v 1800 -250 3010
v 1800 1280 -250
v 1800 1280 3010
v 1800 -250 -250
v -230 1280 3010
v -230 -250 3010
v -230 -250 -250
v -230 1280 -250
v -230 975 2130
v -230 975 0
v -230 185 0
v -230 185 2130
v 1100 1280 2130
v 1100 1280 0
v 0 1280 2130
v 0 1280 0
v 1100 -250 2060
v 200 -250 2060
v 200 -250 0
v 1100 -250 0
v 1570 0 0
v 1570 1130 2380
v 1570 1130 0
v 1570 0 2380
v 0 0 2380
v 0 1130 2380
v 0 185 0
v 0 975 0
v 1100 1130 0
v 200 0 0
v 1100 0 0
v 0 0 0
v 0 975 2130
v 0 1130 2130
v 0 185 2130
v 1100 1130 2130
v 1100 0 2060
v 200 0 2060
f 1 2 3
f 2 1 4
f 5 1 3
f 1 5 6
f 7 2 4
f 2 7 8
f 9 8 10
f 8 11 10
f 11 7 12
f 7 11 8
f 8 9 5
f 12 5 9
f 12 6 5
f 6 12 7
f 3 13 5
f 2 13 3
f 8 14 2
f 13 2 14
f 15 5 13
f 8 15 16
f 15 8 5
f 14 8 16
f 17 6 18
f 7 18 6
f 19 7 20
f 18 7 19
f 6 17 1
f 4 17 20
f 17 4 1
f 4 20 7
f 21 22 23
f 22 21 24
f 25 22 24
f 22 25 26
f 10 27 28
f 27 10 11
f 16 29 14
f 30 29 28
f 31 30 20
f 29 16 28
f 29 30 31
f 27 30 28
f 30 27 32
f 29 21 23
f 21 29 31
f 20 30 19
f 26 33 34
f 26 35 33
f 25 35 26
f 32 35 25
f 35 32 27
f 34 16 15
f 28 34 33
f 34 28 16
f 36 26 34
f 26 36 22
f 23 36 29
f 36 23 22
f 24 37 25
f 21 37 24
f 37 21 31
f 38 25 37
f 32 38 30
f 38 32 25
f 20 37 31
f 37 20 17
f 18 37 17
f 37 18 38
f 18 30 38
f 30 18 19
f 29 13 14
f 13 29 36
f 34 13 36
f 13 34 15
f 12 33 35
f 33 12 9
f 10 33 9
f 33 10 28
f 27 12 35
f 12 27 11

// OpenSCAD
//created 2015-4-16
//by xdw
//my house 3D model



//鞋柜门廊空间
module porch(){

//进门门厅墙厚度
enter_wall_thick = 250;
//厨房和次卫墙厚度
side_wall_thick = 230;
//与客厅隔墙厚度
kt_wall_thick =150;

//面对进门水平方向长度
length = 1570;
//垂直大门，鞋柜空间宽度
width = 1130;
//高度
height = 2760;
//吊顶
top = 380;
//门洞距离吊顶高度
door_top = 320;
difference(){
//外墙空间
translate([-side_wall_thick,-enter_wall_thick,-enter_wall_thick])
cube([(length+2*side_wall_thick), (width+enter_wall_thick+kt_wall_thick), (height+2*enter_wall_thick)]);
//墙内空间
cube([length,width,height-top]);
//大门门洞
translate([200,-enter_wall_thick,0])
cube([900,enter_wall_thick,height-top-door_top]);
//客厅门洞
translate([0,width,0])
cube([1100,kt_wall_thick,2130]);
//客卫门洞
translate([-side_wall_thick,185,0])
cube([side_wall_thick,790,2130]);
}
}

//饭厅+客厅算作一个living_room
module livingroom(){

//与门廊连接门洞宽度
connect_main_door_width = 1100;
wall_thickness = 310;
//阳台墙厚度
outer_thickness = 250;
//面对进门方向长度
length = 6470;
//宽度
width = 3450;
//高度(不含吊顶)
height = 2760;
//门统一宽度
door_width = 1040; 
//门洞距离顶部高度
top=300;
//阳台门洞距离墙的宽度
door2wall = 700;
//靠次卧的电视墙宽度
tv_wall = 2700;
//靠主卧的墙宽度
bed_wall = 3700;
//靠厨房推拉门上方高度
push_door_top = 650;
//靠厨房推拉门宽度
push_door_width = 1620;
//靠厨房推拉门与门廊中间的墙
push_door_wall = 710;



difference(){
//外墙空间
translate([-wall_thickness,-wall_thickness,-wall_thickness])
cube([width+2*wall_thickness,length+wall_thickness+outer_thickness,height+2*wall_thickness]);
//墙内空间
cube([width,length,height]);
//靠门廊门洞,此处门洞宽度用固定值1100
translate([0,-wall_thickness,0])
cube([connect_main_door_width,wall_thickness,2050]);
//阳台门洞
translate([door2wall,length,0])
cube([width-2*door2wall,outer_thickness,height-top]);
//次卧门洞
//此处门洞比正常还要矮100mm
translate([-wall_thickness,length-tv_wall-door_width,0])
cube([wall_thickness,door_width,height-top-100]);
//主卧门洞
translate([width,length-bed_wall-door_width,0])
cube([wall_thickness,door_width,height-top]);
//厨房饭厅门洞
translate([door_width+push_door_wall,-wall_thickness,0])
cube([push_door_width,wall_thickness,height-push_door_top]);

}
}


//次卫空间
module sub_toilet(){
wall_thickness = 310;
//面对进门方向长度
length = 1870;
//宽度
width = 1650;
//高度(不含吊顶)
height = 2760;
//吊顶高度
top = 400;
//门统一宽度
door_width = 1040;
//门统一高度
door_height = 2050;
//窗户尺寸
win_width = 580;
win_height = 740;


difference(){ 
//外墙空间
translate([-2*wall_thickness-length,-wall_thickness,-wall_thickness])
cube([(length+2*wall_thickness),width+2*wall_thickness,height+2*wall_thickness]);
//室内空间
translate([-wall_thickness-length,0,0])
cube([length,width,height-top]);
//门洞
translate([-wall_thickness,width-door_width,0])
cube([wall_thickness,door_width,door_height]);
//窗子
translate([-length-2*wall_thickness,width-door_width,1100])
cube([wall_thickness,win_width,win_height]);

}
}


//榻榻米与书房还有中间空间看作一个整体

module sub_bedrooms()
{
  module tatami(){}
  module study(){}
}





//去房顶观察
module view_floor(){
//房顶厚度
floor_thickness = 1000;
//去除足够大的平面
maxlength = 100000;
maxwidth = 100000;
//略低于房屋高度的切除面
lowerheight= 2600;

difference(){
//porch();
//livingroom();
//sub_toilet();
translate([0,0,lowerheight])
cube([maxlength,maxwidth,floor_thickness],center = true);
}
}

//鞋柜门廊空间
porch();
//客厅+饭厅
//livingroom();
//次卫
//sub_toilet();


//view_floor();


//各个房间组合
module house(){

union(){
translate([0,1560,0])
livingroom();
porch();
sub_toilet();
}
}
//house();
